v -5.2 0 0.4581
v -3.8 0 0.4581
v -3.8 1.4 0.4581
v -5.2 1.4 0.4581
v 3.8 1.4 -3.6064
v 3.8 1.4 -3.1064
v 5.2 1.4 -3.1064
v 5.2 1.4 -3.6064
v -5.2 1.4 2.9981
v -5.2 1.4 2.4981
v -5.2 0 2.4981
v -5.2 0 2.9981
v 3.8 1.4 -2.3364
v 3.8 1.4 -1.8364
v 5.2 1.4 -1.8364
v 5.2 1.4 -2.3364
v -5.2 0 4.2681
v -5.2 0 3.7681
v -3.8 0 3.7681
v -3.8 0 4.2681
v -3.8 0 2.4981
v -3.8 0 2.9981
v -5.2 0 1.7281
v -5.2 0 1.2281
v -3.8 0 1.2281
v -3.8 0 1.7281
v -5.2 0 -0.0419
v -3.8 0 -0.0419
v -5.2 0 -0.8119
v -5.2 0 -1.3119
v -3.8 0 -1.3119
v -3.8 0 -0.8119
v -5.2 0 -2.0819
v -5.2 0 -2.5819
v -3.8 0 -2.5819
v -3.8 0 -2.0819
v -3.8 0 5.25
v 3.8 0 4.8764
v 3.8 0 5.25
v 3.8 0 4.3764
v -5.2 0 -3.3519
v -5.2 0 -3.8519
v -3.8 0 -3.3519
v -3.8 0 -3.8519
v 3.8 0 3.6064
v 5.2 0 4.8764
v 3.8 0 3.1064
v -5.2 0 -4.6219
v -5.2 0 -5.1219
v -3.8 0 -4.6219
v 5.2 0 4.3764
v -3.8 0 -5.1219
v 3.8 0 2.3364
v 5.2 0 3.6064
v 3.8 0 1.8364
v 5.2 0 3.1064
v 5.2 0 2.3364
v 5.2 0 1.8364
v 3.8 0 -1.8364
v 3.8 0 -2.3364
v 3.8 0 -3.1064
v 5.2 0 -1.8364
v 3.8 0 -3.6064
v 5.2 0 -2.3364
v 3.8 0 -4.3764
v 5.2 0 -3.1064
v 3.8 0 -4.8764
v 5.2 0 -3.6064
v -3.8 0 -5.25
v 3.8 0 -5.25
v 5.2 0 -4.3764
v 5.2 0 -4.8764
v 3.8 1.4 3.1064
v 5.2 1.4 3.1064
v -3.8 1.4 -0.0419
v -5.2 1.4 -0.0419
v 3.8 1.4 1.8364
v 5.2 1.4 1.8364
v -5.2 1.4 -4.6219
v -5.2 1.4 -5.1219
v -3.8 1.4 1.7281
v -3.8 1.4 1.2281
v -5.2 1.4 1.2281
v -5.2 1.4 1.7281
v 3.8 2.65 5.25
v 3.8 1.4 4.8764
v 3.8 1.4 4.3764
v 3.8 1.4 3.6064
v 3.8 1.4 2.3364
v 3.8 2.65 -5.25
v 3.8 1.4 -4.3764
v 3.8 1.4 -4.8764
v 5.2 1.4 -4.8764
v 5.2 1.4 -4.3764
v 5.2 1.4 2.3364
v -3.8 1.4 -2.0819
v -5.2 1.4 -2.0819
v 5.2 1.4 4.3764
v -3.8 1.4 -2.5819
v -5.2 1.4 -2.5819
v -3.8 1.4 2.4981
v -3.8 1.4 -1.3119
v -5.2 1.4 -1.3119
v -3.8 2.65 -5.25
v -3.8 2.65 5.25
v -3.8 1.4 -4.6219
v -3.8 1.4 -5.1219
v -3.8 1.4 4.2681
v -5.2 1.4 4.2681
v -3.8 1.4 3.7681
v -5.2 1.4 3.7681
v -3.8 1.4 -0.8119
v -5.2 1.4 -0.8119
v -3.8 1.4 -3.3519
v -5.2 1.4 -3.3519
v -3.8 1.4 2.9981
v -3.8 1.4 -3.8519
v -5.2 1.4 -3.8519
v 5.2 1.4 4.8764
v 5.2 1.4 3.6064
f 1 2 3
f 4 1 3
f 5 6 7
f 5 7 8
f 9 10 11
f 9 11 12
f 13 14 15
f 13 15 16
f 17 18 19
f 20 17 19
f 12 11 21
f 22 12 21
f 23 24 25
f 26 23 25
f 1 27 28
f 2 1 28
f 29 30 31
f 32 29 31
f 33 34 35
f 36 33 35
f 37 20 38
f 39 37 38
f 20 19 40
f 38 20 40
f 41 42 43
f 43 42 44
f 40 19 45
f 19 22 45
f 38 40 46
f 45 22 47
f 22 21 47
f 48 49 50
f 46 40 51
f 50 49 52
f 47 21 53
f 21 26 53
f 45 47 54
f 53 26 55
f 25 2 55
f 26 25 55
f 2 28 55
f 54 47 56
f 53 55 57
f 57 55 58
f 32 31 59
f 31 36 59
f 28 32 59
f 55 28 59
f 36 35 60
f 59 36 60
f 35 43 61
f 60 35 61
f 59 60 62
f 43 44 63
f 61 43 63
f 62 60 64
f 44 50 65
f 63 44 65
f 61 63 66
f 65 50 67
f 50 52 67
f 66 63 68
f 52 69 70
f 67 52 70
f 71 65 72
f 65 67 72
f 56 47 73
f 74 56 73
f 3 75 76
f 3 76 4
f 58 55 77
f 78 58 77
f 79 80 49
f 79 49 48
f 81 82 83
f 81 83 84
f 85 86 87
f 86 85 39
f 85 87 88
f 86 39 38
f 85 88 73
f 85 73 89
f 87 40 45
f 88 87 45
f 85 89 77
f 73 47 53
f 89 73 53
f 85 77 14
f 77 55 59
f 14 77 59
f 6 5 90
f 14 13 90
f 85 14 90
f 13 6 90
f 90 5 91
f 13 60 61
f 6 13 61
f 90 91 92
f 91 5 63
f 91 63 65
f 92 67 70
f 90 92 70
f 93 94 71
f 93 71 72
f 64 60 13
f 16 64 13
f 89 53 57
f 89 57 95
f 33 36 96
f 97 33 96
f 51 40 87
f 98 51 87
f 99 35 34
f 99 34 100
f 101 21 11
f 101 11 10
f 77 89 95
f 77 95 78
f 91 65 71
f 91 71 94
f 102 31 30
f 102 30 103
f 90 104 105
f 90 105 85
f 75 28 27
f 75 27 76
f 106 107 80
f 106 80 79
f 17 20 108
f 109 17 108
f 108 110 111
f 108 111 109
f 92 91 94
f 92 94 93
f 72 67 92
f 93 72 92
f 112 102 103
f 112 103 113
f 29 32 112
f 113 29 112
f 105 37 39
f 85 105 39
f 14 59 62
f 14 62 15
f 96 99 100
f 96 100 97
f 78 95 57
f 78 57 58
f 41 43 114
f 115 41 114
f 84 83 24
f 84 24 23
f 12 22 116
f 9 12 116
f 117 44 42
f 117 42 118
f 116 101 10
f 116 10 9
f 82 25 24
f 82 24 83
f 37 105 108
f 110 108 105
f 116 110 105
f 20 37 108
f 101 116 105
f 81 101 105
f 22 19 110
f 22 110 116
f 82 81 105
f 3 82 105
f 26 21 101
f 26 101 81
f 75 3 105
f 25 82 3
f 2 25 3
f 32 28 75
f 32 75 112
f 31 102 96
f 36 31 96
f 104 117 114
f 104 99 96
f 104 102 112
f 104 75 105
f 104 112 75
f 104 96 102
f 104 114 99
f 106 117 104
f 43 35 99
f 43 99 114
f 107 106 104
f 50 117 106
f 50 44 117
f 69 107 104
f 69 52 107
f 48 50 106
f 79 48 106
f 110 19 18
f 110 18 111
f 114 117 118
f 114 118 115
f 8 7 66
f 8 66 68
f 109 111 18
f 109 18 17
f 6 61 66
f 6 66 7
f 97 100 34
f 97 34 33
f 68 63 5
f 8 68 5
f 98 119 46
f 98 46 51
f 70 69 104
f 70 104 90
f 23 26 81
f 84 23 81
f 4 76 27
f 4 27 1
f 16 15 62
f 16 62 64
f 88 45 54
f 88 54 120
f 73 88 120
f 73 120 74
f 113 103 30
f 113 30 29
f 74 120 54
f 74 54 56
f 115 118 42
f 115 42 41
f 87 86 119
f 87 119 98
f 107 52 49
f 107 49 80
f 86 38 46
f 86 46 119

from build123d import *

# Parameters (mm, degrees)
SKETCH1_W           = 7.6
SKETCH1_H           = 10.5
BOSS_EXTRUDE1_DEPTH = 2.65
SKETCH2_W           = 0.5
SKETCH2_H           = 1.4
BOSS_EXTRUDE2_DEPTH = 1.4
SKETCH4_W           = 0.5
SKETCH4_H           = 1.4
BOSS_EXTRUDE3_DEPTH = 1.4


with BuildPart() as part:
    # Sketch1 → Boss-Extrude1 (new body)
    with BuildSketch(Plane(origin=(0, 0, 0), x_dir=(1, 0, 0), z_dir=(0, 1, 0))):
        Rectangle(SKETCH1_W, SKETCH1_H)
    extrude(amount=BOSS_EXTRUDE1_DEPTH)

    # Sketch2 → Boss-Extrude2 (add)
    with BuildSketch(Plane.ZY.offset(3.8)):
        with Locations((-4.871874673, 0.7)):
            Rectangle(SKETCH2_W, SKETCH2_H)
        with Locations((-3.601874673, 0.7)):
            Rectangle(SKETCH2_W, SKETCH2_H)
        with Locations((-2.331874673, 0.7)):
            Rectangle(SKETCH2_W, SKETCH2_H)
        with Locations((-1.061874673, 0.7)):
            Rectangle(SKETCH2_W, SKETCH2_H)
        with Locations((0.208125327, 0.7)):
            Rectangle(SKETCH2_W, SKETCH2_H)
        with Locations((1.478125327, 0.7)):
            Rectangle(SKETCH2_W, SKETCH2_H)
        with Locations((2.748125327, 0.7)):
            Rectangle(SKETCH2_W, SKETCH2_H)
        with Locations((4.018125327, 0.7)):
            Rectangle(SKETCH2_W, SKETCH2_H)
    extrude(amount=BOSS_EXTRUDE2_DEPTH)

    # Sketch4 → Boss-Extrude3 (add)
    with BuildSketch(Plane(origin=(3.8, 0, 0), x_dir=(0, 0, -1), z_dir=(1, 0, 0))):
        with Locations((-4.626381769, 0.7)):
            Rectangle(SKETCH4_W, SKETCH4_H)
        with Locations((-3.356381769, 0.7)):
            Rectangle(SKETCH4_W, SKETCH4_H)
        with Locations((-2.086381769, 0.7)):
            Rectangle(SKETCH4_W, SKETCH4_H)
        with Locations((2.086381769, 0.7)):
            Rectangle(SKETCH4_W, SKETCH4_H)
        with Locations((3.356381769, 0.7)):
            Rectangle(SKETCH4_W, SKETCH4_H)
        with Locations((4.626381769, 0.7)):
            Rectangle(SKETCH4_W, SKETCH4_H)
    extrude(amount=BOSS_EXTRUDE3_DEPTH)


solid = part.part
